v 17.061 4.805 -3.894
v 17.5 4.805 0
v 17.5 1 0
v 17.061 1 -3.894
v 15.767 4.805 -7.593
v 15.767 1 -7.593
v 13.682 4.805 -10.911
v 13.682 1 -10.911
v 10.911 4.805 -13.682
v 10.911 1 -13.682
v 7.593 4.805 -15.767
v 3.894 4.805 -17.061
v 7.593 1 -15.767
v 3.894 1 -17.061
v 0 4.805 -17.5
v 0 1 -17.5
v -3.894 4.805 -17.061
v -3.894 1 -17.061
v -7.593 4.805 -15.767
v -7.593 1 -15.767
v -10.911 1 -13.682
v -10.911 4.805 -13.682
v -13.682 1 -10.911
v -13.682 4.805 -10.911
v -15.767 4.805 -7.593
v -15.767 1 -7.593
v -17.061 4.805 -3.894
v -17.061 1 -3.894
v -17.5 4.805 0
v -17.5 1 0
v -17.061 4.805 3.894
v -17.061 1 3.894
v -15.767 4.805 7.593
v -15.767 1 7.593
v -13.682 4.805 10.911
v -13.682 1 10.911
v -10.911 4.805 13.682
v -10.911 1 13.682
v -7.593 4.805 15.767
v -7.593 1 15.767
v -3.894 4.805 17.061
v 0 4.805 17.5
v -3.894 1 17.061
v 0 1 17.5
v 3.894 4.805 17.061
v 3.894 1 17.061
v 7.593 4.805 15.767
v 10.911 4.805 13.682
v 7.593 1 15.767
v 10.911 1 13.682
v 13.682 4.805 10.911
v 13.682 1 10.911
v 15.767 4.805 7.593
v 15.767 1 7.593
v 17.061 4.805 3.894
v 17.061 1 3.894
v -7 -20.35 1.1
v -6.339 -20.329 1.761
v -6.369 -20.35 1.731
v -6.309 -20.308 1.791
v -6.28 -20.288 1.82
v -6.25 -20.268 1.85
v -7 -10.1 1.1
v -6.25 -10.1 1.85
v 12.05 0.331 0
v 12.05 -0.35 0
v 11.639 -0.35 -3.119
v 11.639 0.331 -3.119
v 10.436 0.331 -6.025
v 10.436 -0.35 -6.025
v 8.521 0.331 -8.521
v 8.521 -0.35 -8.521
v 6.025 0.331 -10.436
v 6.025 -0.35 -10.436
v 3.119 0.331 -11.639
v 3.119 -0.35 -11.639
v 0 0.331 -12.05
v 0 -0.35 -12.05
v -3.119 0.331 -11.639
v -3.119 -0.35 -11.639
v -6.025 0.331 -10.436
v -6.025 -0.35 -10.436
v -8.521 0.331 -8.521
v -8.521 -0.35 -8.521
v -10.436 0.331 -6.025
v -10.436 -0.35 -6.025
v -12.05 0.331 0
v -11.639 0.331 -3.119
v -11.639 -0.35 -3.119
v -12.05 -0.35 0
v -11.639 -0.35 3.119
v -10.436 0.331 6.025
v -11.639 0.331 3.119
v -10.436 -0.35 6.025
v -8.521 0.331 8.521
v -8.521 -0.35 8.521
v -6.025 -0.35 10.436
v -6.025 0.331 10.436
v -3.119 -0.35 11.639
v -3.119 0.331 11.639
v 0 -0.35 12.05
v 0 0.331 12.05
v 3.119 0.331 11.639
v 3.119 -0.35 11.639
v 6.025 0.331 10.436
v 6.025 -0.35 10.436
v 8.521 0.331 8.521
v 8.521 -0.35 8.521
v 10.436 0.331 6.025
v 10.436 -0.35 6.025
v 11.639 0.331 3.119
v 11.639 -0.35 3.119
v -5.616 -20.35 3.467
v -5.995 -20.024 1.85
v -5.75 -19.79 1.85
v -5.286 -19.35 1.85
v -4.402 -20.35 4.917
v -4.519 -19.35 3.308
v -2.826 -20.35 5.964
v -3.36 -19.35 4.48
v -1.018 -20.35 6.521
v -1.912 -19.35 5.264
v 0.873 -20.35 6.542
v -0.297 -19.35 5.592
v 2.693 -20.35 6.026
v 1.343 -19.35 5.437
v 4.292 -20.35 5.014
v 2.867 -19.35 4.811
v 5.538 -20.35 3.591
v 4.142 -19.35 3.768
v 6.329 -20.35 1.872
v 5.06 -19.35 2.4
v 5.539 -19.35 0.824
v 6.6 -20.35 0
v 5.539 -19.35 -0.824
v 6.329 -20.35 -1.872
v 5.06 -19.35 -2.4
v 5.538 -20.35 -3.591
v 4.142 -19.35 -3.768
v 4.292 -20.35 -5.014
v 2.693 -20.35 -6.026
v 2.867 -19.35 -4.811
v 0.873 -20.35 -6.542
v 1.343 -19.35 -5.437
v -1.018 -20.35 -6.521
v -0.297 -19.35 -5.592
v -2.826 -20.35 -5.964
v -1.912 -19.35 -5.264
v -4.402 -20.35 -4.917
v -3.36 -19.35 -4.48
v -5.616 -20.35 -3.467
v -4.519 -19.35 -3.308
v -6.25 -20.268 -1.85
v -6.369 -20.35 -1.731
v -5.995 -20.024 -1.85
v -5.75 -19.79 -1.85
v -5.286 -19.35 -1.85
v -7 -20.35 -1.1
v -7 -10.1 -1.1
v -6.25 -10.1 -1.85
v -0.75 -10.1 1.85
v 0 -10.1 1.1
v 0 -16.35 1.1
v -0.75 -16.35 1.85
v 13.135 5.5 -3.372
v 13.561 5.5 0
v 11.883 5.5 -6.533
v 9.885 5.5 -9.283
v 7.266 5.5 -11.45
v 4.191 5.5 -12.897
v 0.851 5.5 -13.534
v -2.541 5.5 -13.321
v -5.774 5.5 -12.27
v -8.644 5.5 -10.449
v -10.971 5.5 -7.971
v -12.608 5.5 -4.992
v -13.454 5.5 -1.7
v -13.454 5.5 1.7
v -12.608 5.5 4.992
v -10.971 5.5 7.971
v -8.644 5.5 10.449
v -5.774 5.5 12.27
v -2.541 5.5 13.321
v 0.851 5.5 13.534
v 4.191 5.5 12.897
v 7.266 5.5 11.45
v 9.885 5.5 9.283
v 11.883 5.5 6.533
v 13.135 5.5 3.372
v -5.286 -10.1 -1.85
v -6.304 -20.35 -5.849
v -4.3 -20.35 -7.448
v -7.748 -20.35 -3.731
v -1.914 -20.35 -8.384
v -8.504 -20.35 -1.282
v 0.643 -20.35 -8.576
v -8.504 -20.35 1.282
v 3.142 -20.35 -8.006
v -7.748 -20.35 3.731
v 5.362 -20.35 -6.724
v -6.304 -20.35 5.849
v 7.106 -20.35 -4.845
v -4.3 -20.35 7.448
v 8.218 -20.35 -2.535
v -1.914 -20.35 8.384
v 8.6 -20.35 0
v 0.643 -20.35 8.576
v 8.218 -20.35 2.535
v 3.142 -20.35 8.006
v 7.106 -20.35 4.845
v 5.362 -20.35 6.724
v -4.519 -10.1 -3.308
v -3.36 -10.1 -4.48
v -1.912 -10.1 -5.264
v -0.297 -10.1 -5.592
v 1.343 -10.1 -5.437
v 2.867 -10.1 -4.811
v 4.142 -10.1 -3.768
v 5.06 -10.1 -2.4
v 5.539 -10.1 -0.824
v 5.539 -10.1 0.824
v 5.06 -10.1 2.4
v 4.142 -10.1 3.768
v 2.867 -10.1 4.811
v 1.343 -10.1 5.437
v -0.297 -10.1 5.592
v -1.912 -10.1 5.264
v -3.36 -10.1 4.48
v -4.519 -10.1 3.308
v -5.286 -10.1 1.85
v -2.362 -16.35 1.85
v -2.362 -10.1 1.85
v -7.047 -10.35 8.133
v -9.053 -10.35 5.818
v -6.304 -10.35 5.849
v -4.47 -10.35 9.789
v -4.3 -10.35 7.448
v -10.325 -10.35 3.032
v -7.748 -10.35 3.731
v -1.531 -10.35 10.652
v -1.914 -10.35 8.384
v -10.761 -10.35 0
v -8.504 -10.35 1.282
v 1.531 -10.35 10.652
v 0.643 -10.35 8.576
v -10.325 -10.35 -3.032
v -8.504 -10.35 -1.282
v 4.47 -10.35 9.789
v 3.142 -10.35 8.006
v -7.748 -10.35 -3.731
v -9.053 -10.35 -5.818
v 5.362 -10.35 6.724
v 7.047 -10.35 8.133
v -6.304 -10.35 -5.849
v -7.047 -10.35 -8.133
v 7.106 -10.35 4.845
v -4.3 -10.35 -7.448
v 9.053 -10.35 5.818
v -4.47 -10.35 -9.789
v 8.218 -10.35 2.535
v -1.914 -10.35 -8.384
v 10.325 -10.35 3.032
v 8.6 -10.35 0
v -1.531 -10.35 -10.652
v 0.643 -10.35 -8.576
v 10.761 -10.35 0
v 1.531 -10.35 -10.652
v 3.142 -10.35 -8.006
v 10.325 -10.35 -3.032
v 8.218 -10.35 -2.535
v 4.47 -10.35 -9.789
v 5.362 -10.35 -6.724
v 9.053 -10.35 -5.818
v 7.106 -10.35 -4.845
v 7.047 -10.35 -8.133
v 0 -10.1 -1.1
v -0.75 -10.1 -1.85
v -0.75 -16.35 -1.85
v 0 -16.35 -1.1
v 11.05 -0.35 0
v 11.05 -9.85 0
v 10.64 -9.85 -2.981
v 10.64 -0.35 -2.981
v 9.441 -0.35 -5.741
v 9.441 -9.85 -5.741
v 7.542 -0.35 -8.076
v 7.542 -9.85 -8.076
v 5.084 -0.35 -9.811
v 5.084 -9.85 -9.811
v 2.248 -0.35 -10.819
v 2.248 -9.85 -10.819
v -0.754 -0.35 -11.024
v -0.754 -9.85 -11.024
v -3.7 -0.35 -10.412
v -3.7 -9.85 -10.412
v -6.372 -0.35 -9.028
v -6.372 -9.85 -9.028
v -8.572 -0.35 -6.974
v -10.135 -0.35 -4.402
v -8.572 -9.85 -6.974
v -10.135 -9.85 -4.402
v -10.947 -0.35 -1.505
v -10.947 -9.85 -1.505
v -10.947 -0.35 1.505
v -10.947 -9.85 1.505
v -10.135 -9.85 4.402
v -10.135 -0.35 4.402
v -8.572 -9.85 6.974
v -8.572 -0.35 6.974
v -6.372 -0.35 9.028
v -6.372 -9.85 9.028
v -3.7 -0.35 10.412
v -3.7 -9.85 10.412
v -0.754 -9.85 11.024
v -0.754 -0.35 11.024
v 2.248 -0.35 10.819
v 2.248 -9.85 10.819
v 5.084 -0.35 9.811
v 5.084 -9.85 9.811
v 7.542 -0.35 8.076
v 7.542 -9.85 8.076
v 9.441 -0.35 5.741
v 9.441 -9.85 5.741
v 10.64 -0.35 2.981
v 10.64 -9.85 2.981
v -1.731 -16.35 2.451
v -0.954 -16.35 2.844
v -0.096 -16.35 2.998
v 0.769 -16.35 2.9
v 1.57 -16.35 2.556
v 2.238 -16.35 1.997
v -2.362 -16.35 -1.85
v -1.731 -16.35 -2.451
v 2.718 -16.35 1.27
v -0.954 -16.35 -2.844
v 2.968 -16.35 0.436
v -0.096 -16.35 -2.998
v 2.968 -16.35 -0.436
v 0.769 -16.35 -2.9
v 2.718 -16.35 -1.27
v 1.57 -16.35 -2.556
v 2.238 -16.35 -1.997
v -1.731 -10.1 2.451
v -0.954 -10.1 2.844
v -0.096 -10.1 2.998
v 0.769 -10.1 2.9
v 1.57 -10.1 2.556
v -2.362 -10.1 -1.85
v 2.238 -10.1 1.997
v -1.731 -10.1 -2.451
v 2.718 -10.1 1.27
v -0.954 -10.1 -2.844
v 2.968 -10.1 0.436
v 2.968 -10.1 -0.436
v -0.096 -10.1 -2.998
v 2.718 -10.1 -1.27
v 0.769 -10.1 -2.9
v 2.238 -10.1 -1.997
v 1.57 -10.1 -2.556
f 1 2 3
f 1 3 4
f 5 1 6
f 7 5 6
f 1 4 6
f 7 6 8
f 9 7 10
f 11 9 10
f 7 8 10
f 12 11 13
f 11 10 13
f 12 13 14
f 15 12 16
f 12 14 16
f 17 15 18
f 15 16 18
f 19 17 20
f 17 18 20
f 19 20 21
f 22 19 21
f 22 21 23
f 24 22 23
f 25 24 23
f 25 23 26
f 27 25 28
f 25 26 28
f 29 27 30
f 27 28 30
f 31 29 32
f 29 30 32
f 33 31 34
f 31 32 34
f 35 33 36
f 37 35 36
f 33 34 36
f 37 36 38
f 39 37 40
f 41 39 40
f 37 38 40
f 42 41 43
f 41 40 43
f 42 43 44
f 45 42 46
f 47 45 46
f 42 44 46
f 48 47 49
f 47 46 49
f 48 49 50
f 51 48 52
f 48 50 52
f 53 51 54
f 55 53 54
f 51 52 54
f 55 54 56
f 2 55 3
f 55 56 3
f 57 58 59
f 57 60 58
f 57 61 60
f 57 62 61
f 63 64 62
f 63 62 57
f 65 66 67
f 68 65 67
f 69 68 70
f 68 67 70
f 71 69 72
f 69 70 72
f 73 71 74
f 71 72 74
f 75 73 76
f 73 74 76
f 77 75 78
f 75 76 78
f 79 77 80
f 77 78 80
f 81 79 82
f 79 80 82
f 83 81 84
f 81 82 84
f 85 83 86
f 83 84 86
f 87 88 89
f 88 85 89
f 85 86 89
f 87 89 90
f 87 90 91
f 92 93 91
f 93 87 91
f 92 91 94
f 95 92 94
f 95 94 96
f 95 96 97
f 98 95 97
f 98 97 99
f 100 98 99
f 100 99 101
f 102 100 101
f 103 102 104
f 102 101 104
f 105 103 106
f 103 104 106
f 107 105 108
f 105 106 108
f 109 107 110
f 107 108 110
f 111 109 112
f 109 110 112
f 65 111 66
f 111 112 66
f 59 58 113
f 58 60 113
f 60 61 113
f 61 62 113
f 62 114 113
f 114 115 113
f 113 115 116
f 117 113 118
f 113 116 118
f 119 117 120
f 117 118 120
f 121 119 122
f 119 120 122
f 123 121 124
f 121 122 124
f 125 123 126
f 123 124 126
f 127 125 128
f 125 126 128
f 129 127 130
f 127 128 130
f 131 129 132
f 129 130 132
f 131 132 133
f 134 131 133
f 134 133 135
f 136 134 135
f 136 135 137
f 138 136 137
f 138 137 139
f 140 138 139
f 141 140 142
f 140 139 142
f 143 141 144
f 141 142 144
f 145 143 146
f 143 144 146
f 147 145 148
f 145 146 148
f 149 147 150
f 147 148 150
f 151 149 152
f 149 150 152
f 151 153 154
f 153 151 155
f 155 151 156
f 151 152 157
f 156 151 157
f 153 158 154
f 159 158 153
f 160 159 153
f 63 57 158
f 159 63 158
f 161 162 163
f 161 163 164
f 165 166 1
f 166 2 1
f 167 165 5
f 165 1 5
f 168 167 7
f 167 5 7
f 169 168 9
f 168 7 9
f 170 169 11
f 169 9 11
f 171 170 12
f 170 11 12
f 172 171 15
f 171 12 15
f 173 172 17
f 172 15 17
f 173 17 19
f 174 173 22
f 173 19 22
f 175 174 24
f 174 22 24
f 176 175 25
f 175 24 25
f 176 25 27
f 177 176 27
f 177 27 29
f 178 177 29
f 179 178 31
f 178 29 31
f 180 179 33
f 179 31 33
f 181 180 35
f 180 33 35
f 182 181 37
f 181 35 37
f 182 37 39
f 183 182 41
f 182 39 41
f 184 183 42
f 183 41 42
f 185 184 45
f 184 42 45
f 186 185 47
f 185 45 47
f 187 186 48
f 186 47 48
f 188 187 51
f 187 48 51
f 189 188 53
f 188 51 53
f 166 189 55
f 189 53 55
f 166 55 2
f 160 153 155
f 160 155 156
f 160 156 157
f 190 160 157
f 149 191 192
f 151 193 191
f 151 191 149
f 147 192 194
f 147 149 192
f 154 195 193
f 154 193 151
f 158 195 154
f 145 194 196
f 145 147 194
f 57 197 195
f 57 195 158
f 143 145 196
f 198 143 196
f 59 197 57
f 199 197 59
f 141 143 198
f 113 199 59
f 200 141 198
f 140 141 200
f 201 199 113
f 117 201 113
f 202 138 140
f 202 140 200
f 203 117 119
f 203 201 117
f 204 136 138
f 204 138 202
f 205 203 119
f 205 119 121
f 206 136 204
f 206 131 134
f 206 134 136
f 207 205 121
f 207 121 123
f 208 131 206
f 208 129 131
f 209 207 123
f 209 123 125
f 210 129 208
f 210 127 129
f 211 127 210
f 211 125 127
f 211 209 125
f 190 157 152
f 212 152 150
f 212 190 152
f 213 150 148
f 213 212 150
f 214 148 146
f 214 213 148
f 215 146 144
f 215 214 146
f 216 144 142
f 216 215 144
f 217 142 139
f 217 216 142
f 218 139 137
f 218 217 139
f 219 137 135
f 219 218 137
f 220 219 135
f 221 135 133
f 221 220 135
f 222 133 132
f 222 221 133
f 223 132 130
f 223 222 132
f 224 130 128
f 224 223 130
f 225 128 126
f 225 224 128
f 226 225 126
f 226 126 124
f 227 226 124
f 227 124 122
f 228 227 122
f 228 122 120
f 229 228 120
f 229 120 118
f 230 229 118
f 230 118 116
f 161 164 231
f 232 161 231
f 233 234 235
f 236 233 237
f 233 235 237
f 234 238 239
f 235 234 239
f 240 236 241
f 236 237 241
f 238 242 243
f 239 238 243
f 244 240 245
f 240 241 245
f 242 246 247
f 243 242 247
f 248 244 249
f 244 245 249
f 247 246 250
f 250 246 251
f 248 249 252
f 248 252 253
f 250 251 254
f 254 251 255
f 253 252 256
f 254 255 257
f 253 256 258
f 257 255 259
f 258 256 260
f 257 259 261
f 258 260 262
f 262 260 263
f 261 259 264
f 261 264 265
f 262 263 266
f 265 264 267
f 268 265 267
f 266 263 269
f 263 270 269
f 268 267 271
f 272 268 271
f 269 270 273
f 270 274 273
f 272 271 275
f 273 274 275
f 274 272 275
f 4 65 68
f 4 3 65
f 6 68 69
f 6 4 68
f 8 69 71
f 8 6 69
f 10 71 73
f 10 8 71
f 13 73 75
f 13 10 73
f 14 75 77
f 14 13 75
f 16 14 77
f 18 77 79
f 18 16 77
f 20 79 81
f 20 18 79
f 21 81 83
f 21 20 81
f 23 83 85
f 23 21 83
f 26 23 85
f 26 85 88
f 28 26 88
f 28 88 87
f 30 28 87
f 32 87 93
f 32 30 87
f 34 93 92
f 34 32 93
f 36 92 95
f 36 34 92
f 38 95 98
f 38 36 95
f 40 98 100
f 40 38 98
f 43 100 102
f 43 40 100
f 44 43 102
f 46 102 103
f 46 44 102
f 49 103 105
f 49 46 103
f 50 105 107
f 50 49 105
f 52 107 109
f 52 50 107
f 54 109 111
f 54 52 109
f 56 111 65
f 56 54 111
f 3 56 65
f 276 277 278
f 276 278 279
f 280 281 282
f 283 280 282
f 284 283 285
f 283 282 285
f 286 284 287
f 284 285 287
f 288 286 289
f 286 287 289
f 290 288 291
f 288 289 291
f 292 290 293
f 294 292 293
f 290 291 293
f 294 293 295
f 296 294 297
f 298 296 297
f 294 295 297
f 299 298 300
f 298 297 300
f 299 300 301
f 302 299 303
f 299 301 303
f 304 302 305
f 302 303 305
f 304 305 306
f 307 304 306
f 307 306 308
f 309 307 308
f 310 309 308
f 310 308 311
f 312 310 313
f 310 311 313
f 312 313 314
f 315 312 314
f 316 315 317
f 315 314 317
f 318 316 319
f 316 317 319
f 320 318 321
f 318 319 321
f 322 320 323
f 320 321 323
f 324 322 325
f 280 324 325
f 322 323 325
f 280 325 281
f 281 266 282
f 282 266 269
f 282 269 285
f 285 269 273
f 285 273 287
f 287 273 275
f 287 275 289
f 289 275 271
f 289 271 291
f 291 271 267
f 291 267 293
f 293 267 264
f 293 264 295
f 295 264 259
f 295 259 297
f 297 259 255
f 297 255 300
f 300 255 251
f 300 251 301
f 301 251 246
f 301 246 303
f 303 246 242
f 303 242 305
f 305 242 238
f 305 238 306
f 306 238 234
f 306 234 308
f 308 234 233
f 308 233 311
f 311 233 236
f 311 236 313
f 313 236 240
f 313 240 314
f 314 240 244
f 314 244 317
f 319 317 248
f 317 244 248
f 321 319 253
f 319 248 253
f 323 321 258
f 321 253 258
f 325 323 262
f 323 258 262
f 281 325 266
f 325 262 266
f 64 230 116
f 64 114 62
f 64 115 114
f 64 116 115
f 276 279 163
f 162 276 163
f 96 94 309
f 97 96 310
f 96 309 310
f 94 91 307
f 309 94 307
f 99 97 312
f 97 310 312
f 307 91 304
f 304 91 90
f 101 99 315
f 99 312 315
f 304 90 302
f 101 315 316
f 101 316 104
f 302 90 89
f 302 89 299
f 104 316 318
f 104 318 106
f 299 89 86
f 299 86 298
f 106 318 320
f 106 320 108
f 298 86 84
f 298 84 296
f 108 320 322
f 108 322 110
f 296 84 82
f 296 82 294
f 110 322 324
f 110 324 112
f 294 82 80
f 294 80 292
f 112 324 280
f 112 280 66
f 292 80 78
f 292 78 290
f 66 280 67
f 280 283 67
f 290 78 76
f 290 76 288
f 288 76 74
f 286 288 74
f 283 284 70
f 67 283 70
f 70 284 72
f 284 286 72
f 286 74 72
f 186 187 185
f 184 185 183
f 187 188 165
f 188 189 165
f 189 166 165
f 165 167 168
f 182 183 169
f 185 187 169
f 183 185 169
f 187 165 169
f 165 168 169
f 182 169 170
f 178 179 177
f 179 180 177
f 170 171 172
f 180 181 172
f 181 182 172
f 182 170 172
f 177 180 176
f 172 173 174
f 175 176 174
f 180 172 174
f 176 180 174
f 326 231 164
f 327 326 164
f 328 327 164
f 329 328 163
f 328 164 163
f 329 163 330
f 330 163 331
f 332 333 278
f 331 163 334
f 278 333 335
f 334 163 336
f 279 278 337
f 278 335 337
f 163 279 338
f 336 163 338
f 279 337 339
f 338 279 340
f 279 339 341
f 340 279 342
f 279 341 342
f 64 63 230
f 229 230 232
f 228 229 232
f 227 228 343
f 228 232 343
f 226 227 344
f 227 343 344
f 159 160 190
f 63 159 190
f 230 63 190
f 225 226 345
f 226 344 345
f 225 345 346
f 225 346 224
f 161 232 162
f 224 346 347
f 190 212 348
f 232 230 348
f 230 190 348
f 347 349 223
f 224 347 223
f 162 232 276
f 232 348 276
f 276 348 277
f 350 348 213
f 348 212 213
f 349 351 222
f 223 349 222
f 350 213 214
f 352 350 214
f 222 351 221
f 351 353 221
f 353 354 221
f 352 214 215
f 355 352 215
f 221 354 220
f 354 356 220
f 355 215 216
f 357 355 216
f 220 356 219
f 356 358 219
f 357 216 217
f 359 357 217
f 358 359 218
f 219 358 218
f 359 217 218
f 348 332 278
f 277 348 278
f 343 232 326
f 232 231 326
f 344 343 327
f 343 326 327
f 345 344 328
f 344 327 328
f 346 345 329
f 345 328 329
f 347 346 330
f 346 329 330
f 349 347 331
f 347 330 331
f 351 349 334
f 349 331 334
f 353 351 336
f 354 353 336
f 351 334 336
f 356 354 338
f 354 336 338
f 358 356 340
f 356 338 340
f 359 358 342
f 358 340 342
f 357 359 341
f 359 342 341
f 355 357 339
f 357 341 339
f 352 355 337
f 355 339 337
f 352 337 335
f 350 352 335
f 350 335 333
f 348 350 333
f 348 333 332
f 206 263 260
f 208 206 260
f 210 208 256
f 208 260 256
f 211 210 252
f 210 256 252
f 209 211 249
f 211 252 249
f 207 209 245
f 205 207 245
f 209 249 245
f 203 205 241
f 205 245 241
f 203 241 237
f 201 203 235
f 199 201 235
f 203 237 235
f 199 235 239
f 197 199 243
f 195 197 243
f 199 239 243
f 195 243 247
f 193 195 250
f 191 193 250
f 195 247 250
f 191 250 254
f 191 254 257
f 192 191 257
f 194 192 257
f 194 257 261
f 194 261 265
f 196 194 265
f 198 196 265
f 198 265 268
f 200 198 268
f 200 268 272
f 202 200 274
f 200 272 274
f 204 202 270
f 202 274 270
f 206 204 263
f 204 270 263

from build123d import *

# Parameters (mm, degrees)
CHAMFER2_SIZE                  = 8.144346428
CHAMFER2_SIZE_2                = 1
SKETCH8_R                      = 8.6
SKETCH8_R_2                    = 5.6
BOSS_EXTRUDE7_DEPTH            = 10
CUT_EXTRUDE1_REACH             = 35.014
CUT_EXTRUDE1_DIRECTION_2_REACH = 35.014
CHAMFER1_SIZE                  = 1
CHAMFER3_SIZE                  = 0.5
CHAMFER3_SIZE2                 = 0.288675135


with BuildPart() as part:
    # Sketch1 → Revolve1 (revolve)
    with BuildSketch(Plane.XY, mode=Mode.PRIVATE) as revolve1_sk:
        Polygon((-13.560768988, 5.5), (-17.5, 4.805407289), (-17.5, 0), (-12.05, 0), (-12.05, -0.35), (-11.05, -0.35), (-11.05, -10.35), (-5.6, -10.35), (-5.6, -10.1), (-3, -10.1), (-3, -16.35), (0, -16.35), (0, 5.5), align=None)
    revolve(revolve1_sk.sketch.rotate(Axis((0, -16.35, 0), (0, 1, 0)), 180), axis=Axis((0, -16.35, 0), (0, 1, 0)))

    # Chamfer2
    # the kernel refuses this chamfer: 8.144346428, 1 mm, written as the material it takes off along each edge
    with BuildSketch(Plane(origin=(0, 0, 0), x_dir=(1, 0, 0), z_dir=(0, 0, 1))) as chamfer2_piece_1_section:
        Polygon((17.5 - CHAMFER2_SIZE, 0), (17.5, CHAMFER2_SIZE_2), (17.5, 0), align=None)
    chamfer2_piece_1 = revolve(axis=Axis((0, 0, 0), (0, 1, 0)), mode=Mode.PRIVATE)
    chamfer2_piece_1 = chamfer2_piece_1 - Plane(origin=(0, 0.608985378, 0), x_dir=(1, 0, 0), z_dir=(0, -1, 0)) * Cylinder(12.05, 70, mode=Mode.PRIVATE)
    add(chamfer2_piece_1, mode=Mode.SUBTRACT)

    # Sketch8 → Boss-Extrude7 (add)
    with BuildSketch(Plane.XZ.offset(10.35)):
        Circle(SKETCH8_R)
        Circle(SKETCH8_R_2, mode=Mode.SUBTRACT)
    extrude(amount=BOSS_EXTRUDE7_DEPTH)

    # Cut-Extrude1: up to this face of the body (flat: up to its plane)
    cut_extrude1_end = Plane(part.part.faces().sort_by_distance((-5.441608081, -10.1, 0))[0])
    # Sketch2 → Cut-Extrude1 (cut, up to the picked face)
    with BuildSketch(Plane.XZ.offset(16.35), mode=Mode.PRIVATE) as cut_extrude1_sk1:
        Polygon((-6.25, 1.85), (-7, 1.1), (-7, -1.1), (-6.25, -1.85), (-0.75, -1.85), (0, -1.1), (0, 1.1), (-0.75, 1.85), align=None)
    cut_extrude1_tool1 = split(extrude(cut_extrude1_sk1.sketch, amount=-CUT_EXTRUDE1_REACH, mode=Mode.PRIVATE), bisect_by=cut_extrude1_end, keep=Keep.BOTH, mode=Mode.PRIVATE)
    add(cut_extrude1_tool1.solids().sort_by(Axis((-3.5, -16.35, 0), (0, 1, 0)))[0], mode=Mode.SUBTRACT)

    # Cut-Extrude1 direction 2: up to this face of the body (flat: up to its plane)
    cut_extrude1_direction_2_end = Plane(part.part.faces().sort_by_distance((-8.356755267, -20.35, 0))[0])
    # Sketch2 → Cut-Extrude1 direction 2 (cut, up to the picked face)
    with BuildSketch(Plane.XZ.offset(16.35), mode=Mode.PRIVATE) as cut_extrude1_direction_2_sk1:
        Polygon((-6.25, 1.85), (-7, 1.1), (-7, -1.1), (-6.25, -1.85), (-0.75, -1.85), (0, -1.1), (0, 1.1), (-0.75, 1.85), align=None)
    cut_extrude1_direction_2_tool1 = split(extrude(cut_extrude1_direction_2_sk1.sketch, amount=CUT_EXTRUDE1_DIRECTION_2_REACH, mode=Mode.PRIVATE), bisect_by=cut_extrude1_direction_2_end, keep=Keep.BOTH, mode=Mode.PRIVATE)
    add(cut_extrude1_direction_2_tool1.solids().sort_by(Axis((-3.5, -16.35, 0), (0, -1, 0)))[0], mode=Mode.SUBTRACT)

    # Chamfer1
    chamfer1_edges = [part.edges().sort_by_distance(p)[0] for p in [
        (5.6, -20.35, 0),
    ]]
    chamfer(chamfer1_edges, length=CHAMFER1_SIZE)

    # Chamfer3
    chamfer3_edges = [part.edges().sort_by_distance(p)[0] for p in [
        (-11.05, -10.35, 0),
    ]]
    chamfer3_side = [part.faces().sort_by_distance(p)[0] for p in [
        (-11.05, -5.35, 0),
    ]]
    chamfer(chamfer3_edges, length=CHAMFER3_SIZE, length2=CHAMFER3_SIZE2, reference=chamfer3_side[0])


solid = part.part
